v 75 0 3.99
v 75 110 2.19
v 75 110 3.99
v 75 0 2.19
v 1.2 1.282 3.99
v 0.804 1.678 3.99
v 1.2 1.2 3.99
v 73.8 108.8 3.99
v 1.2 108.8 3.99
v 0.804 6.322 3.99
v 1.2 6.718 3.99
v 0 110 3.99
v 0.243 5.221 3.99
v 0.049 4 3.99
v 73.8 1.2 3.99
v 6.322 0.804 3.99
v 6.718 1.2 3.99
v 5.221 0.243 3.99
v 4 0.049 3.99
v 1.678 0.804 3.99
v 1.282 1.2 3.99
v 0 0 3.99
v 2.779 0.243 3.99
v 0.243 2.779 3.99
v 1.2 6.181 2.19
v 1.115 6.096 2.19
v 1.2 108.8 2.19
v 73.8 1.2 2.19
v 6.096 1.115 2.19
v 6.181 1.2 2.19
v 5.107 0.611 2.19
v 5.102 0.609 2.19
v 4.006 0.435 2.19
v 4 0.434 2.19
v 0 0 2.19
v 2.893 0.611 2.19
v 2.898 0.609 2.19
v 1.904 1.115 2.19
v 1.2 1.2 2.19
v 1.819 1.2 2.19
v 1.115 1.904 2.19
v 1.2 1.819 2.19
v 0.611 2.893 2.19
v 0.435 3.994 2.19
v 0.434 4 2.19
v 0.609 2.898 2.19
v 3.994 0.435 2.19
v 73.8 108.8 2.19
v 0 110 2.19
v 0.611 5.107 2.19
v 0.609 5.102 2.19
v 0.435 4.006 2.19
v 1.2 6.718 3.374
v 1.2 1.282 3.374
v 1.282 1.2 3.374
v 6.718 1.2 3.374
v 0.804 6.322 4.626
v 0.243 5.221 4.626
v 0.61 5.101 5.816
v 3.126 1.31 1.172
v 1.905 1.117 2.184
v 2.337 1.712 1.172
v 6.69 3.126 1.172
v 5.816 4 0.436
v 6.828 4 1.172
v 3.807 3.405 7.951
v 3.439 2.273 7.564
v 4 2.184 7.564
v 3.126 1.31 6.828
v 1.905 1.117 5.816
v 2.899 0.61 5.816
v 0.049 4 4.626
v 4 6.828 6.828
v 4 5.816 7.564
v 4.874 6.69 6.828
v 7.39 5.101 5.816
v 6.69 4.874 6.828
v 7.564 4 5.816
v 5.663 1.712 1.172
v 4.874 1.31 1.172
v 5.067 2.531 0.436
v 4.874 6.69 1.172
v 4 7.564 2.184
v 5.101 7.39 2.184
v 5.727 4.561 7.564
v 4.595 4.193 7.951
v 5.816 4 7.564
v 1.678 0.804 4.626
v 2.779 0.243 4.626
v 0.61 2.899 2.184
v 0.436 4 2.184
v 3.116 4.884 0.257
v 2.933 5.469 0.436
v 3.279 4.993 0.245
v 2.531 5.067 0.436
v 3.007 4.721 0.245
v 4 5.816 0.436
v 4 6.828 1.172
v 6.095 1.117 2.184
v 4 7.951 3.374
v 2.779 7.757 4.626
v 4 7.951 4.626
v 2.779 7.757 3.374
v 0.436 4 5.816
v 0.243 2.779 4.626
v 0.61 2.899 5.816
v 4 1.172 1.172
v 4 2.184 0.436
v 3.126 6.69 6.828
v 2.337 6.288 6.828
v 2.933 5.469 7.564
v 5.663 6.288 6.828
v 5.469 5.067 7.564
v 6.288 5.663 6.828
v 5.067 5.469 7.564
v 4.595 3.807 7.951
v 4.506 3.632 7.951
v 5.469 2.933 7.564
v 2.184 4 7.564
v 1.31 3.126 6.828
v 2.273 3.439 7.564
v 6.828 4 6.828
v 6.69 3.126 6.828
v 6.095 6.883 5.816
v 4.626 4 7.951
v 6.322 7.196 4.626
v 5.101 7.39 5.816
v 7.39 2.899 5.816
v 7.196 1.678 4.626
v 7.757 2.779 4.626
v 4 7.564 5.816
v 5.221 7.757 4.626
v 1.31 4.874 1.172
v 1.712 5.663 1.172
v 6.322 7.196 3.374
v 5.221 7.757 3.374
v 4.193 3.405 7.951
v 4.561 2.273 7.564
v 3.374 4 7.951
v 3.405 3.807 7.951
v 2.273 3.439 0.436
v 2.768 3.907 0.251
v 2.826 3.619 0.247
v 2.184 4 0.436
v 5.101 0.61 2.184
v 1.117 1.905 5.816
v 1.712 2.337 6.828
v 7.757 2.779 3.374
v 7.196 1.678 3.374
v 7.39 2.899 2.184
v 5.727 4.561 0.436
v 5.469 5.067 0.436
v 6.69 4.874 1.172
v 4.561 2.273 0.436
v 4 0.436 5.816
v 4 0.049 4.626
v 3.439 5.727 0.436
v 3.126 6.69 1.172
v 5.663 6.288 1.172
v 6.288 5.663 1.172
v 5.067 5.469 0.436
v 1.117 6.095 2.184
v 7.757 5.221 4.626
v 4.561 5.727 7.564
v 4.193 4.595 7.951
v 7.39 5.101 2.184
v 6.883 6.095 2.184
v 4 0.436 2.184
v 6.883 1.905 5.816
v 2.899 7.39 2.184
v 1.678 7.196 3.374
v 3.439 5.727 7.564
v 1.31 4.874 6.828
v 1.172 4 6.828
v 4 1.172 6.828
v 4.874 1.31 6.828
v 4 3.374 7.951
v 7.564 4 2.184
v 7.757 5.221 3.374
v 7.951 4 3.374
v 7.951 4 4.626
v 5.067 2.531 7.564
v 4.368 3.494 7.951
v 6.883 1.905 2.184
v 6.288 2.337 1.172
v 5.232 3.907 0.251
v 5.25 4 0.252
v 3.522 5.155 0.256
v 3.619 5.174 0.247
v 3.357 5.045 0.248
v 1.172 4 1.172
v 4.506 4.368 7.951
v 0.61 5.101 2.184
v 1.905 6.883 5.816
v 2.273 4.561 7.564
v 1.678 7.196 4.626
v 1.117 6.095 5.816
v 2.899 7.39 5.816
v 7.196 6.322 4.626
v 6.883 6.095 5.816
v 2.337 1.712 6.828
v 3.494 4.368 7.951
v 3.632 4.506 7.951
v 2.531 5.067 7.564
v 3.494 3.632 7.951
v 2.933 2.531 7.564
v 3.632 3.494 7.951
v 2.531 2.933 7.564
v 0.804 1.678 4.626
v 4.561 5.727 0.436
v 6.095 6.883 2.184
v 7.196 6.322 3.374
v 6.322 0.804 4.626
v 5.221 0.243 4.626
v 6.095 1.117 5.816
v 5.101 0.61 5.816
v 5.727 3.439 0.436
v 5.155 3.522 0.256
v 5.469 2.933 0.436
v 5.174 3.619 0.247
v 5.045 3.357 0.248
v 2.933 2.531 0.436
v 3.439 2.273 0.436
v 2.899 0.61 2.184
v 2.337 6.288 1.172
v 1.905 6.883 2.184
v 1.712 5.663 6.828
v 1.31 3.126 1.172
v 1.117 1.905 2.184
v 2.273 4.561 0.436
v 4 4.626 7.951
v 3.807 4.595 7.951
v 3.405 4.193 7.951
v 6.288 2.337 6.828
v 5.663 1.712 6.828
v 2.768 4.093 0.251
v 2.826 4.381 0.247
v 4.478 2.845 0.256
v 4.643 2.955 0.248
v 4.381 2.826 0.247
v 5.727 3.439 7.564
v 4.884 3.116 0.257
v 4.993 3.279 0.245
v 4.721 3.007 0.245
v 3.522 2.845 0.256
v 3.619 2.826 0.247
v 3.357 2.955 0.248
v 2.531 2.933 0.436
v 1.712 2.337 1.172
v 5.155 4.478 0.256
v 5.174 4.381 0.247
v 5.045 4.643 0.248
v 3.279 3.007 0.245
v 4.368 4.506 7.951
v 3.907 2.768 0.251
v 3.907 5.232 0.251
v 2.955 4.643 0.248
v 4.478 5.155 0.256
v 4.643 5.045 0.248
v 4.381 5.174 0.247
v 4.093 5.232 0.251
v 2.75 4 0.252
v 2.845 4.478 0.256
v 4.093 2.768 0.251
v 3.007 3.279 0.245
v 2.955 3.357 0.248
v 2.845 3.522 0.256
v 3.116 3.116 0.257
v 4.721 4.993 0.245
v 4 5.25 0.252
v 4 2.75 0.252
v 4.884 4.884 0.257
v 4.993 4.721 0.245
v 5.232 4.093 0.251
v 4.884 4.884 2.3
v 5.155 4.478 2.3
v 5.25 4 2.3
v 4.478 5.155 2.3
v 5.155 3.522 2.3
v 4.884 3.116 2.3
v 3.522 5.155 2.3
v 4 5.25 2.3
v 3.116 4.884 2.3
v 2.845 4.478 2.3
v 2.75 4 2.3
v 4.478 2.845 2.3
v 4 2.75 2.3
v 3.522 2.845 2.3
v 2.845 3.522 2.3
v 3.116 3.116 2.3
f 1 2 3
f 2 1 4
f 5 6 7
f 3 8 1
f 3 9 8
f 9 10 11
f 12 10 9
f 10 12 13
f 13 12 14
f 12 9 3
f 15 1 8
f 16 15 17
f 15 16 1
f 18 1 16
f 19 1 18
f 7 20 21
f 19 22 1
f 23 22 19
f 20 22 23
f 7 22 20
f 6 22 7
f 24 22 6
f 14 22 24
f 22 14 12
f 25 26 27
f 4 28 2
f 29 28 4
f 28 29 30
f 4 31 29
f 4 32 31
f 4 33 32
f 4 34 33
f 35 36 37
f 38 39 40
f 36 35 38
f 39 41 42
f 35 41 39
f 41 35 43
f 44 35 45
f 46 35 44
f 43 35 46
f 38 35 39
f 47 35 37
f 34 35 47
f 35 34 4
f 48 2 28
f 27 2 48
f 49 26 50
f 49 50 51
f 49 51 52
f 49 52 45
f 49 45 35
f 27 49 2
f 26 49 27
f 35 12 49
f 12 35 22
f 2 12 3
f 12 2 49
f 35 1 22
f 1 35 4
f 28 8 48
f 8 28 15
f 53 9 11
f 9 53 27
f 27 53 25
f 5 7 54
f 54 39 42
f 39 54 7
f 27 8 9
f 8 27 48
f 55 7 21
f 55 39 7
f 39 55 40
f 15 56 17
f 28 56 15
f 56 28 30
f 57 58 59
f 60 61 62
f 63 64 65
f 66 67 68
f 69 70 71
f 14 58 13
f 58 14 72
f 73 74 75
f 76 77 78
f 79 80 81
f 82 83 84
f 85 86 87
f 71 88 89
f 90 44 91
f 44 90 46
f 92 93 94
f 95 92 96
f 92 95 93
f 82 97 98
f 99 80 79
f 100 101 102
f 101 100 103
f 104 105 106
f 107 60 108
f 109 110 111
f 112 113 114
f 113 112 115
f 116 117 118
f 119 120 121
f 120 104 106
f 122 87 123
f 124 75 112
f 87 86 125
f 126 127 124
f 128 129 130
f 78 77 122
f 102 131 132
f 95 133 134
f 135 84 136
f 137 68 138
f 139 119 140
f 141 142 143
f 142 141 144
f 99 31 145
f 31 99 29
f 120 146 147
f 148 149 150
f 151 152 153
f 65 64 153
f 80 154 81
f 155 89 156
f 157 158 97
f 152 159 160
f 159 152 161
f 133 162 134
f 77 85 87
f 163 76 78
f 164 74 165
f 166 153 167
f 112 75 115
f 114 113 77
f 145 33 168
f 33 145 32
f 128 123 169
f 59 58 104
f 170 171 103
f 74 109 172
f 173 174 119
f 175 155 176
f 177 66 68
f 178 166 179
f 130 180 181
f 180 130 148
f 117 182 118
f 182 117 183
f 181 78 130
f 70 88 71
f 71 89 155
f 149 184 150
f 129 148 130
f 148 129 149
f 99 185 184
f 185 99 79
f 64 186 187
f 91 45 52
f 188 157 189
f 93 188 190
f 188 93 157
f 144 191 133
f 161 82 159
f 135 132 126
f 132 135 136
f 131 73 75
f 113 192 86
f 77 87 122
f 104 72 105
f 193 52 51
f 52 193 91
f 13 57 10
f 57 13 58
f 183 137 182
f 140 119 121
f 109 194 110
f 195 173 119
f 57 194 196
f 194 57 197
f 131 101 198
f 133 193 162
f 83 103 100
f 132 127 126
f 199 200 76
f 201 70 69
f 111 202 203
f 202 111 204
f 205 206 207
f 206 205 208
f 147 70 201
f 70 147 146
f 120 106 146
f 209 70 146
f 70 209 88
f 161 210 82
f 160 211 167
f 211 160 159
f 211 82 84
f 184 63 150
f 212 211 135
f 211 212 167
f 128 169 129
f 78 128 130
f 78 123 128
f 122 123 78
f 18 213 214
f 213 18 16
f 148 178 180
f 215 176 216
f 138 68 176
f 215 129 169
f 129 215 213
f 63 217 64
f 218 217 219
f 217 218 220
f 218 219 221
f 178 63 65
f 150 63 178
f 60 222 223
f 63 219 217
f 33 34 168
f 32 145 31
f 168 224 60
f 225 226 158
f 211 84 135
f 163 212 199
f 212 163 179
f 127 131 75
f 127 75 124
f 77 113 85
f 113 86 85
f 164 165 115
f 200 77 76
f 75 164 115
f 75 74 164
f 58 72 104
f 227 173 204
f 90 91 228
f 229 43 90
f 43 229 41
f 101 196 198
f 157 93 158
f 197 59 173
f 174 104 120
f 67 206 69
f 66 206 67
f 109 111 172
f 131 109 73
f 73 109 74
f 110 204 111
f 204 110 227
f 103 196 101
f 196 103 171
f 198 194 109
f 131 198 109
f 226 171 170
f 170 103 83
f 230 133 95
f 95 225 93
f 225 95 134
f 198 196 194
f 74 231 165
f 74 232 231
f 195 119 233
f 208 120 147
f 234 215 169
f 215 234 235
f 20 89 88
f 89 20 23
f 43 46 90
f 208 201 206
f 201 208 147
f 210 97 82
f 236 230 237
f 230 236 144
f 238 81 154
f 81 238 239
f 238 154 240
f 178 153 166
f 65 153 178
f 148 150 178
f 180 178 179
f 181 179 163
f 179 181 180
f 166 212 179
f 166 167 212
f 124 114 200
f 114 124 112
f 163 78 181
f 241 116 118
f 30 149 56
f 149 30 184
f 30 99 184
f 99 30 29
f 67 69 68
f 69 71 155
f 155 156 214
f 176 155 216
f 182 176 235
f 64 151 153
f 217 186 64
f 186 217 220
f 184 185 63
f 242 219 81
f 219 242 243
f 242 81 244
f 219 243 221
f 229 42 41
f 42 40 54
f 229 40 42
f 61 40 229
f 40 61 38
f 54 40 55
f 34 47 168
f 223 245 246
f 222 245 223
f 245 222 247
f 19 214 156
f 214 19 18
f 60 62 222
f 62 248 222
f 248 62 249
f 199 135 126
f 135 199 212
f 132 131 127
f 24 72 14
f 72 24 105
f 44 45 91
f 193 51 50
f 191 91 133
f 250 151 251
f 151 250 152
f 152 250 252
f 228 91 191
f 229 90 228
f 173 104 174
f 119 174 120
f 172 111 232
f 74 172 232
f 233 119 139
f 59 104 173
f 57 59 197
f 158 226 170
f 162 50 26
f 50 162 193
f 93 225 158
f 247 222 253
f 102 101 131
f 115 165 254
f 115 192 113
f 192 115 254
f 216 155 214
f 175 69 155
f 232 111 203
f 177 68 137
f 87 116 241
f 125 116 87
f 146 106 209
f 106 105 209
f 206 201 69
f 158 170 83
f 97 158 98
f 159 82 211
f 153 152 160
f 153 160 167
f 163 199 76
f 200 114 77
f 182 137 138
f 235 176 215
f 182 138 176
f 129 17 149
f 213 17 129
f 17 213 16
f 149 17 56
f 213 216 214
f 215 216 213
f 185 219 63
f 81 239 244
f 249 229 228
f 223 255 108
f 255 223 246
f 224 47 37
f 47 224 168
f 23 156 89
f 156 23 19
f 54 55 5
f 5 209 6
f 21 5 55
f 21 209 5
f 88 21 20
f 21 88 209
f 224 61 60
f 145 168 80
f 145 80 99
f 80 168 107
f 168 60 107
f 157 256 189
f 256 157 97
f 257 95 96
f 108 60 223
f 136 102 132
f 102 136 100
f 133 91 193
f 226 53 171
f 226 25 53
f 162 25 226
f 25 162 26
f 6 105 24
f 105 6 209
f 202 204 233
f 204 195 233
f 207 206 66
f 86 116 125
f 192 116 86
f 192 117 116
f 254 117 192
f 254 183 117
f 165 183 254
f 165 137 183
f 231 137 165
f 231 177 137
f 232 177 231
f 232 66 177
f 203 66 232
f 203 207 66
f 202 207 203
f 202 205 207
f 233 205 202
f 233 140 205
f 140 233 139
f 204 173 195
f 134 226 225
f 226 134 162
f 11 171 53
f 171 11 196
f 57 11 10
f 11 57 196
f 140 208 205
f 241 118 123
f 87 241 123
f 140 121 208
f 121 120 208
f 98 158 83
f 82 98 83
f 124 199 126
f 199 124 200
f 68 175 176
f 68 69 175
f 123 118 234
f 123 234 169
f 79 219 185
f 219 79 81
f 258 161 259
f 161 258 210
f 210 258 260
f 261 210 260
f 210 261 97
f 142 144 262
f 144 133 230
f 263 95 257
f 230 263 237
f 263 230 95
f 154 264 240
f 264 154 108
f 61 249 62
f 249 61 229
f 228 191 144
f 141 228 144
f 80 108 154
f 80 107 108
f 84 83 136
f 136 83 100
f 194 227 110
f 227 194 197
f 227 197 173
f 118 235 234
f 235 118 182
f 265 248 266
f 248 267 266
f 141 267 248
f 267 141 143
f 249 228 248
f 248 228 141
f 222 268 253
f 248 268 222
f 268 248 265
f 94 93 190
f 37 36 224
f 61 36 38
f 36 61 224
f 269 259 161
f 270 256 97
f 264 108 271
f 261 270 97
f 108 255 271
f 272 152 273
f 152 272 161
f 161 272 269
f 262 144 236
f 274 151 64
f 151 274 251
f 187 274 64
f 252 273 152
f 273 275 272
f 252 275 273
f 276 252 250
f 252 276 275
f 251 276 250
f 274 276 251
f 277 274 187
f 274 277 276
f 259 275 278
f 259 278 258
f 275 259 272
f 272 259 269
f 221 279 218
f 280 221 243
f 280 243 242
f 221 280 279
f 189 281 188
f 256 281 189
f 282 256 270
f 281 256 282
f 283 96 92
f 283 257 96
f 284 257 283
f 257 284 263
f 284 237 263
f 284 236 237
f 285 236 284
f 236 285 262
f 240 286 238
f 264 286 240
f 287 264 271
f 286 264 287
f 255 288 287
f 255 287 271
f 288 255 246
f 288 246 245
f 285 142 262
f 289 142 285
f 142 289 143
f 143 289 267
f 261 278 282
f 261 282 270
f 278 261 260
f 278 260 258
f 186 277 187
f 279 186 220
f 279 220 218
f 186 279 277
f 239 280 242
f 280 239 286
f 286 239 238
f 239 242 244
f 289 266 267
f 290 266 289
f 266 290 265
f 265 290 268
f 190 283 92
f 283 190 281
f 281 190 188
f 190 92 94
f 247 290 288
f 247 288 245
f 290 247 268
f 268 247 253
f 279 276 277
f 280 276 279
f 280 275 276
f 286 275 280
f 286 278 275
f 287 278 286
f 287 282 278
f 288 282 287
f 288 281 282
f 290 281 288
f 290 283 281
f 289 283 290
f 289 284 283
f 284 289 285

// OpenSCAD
// Pocket Gambler — Rear Lid
// Snaps onto the body's lid_lip_ledge, or secure with 4× M2×6 screws

// ═══════════════════════════════════════════════════
// PARAMETERS (must match body.scad)
// ═══════════════════════════════════════════════════

body_w     = 75;
body_h     = 110;
corner_r   = 4;
lid_t      = 2.2;    // lid plate thickness
lid_lip_t  = 1.2;    // lip thickness (must match body)
lid_lip_d  = 1.8;    // lip depth (must match body)

// Battery door opening
batt_door_w = 37;
batt_door_h = 58;
batt_door_x = (body_w - batt_door_w) / 2;
batt_door_y = (body_h - batt_door_h) / 2 - 5;
door_corner = 2;

// Screw holes (optional — use instead of or in addition to snap clips)
use_screw_holes = true;
screw_dia  = 2.5;    // M2 clearance hole
screw_margin = 4;    // distance from corner

// Snap clip parameters (flexible tabs)
use_snap_clips = false;  // set true if not using screws
clip_w  = 8;
clip_h  = 4;
clip_t  = 1.2;
clip_protrusion = 0.8;


// ═══════════════════════════════════════════════════
// MODULES
// ═══════════════════════════════════════════════════

module rounded_plate(w, h, t, r) {
    minkowski() {
        cube([w - 2*r, h - 2*r, t - r]);
        translate([r, r, r]) sphere(r=r, $fn=20);
    }
}

module lid_lip() {
    // Perimeter lip that inserts into the body opening
    difference() {
        cube([body_w, body_h, lid_lip_d]);
        translate([lid_lip_t, lid_lip_t, -0.1])
            cube([body_w - 2*lid_lip_t, body_h - 2*lid_lip_t, lid_lip_d + 0.2]);
    }
}

module battery_door_opening() {
    translate([batt_door_x, batt_door_y, -0.1])
        minkowski() {
            cube([batt_door_w - 2*door_corner,
                  batt_door_h - 2*door_corner,
                  lid_t + 0.2]);
            cylinder(r=door_corner, h=0.01, $fn=12);
        }
}

module screw_holes() {
    if (use_screw_holes) {
        positions = [
            [screw_margin, screw_margin],
            [body_w - screw_margin, screw_margin],
            [screw_margin, body_h - screw_margin],
            [body_w - screw_margin, body_h - screw_margin]
        ];
        for (p = positions) {
            translate([p[0], p[1], -0.1])
                cylinder(d=screw_dia, h=lid_t + 0.2, $fn=16);
        }
    }
}

module snap_clips() {
    if (use_snap_clips) {
        // 4 flexible clips on inside perimeter
        // Left edge clip
        translate([0, body_h/2 - clip_w/2, lid_t])
            cube([clip_t, clip_w, clip_h]);
        // Right edge clip
        translate([body_w - clip_t, body_h/2 - clip_w/2, lid_t])
            cube([clip_t, clip_w, clip_h]);
        // Top edge clip
        translate([body_w/2 - clip_w/2, body_h - clip_t, lid_t])
            cube([clip_w, clip_t, clip_h]);
        // Bottom edge clip
        translate([body_w/2 - clip_w/2, 0, lid_t])
            cube([clip_w, clip_t, clip_h]);
    }
}


// ═══════════════════════════════════════════════════
// MAIN ASSEMBLY
// ═══════════════════════════════════════════════════

difference() {
    union() {
        rounded_plate(body_w, body_h, lid_t, corner_r);
        translate([0, 0, lid_t - 0.01]) lid_lip();
    }
    battery_door_opening();
    screw_holes();
}

snap_clips();
